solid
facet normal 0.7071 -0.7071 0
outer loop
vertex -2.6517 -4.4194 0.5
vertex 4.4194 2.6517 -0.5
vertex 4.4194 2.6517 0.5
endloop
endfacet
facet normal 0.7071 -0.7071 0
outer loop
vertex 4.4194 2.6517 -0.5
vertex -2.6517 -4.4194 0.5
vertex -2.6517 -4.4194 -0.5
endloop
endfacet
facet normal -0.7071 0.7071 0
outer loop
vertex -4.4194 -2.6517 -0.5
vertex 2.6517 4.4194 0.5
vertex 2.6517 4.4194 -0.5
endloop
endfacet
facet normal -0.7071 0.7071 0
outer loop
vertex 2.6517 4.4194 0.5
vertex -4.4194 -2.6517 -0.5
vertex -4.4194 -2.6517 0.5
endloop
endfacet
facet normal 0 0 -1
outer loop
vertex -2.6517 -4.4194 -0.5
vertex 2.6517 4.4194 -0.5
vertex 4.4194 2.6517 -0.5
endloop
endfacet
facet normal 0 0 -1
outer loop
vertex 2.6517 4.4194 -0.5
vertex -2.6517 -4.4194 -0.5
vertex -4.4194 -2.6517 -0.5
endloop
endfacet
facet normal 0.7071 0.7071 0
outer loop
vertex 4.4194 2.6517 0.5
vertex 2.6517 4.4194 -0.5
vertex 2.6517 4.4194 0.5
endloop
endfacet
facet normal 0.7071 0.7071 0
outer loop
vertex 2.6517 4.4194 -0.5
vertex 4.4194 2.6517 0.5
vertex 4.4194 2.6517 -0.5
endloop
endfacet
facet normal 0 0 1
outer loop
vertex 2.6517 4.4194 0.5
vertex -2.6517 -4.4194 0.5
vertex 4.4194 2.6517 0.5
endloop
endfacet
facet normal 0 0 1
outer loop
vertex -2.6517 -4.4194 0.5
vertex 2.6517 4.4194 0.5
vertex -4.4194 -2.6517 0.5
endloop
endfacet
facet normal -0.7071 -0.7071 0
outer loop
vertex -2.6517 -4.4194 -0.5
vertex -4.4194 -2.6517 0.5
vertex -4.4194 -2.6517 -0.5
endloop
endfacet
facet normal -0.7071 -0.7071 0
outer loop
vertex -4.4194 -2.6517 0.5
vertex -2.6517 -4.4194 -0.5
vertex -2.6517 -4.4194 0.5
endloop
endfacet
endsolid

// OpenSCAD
rotate(a=[90.0, 0.0, 45.0]) {
    cube(size=[10.0, 1.0, 2.5], center=true);
};
